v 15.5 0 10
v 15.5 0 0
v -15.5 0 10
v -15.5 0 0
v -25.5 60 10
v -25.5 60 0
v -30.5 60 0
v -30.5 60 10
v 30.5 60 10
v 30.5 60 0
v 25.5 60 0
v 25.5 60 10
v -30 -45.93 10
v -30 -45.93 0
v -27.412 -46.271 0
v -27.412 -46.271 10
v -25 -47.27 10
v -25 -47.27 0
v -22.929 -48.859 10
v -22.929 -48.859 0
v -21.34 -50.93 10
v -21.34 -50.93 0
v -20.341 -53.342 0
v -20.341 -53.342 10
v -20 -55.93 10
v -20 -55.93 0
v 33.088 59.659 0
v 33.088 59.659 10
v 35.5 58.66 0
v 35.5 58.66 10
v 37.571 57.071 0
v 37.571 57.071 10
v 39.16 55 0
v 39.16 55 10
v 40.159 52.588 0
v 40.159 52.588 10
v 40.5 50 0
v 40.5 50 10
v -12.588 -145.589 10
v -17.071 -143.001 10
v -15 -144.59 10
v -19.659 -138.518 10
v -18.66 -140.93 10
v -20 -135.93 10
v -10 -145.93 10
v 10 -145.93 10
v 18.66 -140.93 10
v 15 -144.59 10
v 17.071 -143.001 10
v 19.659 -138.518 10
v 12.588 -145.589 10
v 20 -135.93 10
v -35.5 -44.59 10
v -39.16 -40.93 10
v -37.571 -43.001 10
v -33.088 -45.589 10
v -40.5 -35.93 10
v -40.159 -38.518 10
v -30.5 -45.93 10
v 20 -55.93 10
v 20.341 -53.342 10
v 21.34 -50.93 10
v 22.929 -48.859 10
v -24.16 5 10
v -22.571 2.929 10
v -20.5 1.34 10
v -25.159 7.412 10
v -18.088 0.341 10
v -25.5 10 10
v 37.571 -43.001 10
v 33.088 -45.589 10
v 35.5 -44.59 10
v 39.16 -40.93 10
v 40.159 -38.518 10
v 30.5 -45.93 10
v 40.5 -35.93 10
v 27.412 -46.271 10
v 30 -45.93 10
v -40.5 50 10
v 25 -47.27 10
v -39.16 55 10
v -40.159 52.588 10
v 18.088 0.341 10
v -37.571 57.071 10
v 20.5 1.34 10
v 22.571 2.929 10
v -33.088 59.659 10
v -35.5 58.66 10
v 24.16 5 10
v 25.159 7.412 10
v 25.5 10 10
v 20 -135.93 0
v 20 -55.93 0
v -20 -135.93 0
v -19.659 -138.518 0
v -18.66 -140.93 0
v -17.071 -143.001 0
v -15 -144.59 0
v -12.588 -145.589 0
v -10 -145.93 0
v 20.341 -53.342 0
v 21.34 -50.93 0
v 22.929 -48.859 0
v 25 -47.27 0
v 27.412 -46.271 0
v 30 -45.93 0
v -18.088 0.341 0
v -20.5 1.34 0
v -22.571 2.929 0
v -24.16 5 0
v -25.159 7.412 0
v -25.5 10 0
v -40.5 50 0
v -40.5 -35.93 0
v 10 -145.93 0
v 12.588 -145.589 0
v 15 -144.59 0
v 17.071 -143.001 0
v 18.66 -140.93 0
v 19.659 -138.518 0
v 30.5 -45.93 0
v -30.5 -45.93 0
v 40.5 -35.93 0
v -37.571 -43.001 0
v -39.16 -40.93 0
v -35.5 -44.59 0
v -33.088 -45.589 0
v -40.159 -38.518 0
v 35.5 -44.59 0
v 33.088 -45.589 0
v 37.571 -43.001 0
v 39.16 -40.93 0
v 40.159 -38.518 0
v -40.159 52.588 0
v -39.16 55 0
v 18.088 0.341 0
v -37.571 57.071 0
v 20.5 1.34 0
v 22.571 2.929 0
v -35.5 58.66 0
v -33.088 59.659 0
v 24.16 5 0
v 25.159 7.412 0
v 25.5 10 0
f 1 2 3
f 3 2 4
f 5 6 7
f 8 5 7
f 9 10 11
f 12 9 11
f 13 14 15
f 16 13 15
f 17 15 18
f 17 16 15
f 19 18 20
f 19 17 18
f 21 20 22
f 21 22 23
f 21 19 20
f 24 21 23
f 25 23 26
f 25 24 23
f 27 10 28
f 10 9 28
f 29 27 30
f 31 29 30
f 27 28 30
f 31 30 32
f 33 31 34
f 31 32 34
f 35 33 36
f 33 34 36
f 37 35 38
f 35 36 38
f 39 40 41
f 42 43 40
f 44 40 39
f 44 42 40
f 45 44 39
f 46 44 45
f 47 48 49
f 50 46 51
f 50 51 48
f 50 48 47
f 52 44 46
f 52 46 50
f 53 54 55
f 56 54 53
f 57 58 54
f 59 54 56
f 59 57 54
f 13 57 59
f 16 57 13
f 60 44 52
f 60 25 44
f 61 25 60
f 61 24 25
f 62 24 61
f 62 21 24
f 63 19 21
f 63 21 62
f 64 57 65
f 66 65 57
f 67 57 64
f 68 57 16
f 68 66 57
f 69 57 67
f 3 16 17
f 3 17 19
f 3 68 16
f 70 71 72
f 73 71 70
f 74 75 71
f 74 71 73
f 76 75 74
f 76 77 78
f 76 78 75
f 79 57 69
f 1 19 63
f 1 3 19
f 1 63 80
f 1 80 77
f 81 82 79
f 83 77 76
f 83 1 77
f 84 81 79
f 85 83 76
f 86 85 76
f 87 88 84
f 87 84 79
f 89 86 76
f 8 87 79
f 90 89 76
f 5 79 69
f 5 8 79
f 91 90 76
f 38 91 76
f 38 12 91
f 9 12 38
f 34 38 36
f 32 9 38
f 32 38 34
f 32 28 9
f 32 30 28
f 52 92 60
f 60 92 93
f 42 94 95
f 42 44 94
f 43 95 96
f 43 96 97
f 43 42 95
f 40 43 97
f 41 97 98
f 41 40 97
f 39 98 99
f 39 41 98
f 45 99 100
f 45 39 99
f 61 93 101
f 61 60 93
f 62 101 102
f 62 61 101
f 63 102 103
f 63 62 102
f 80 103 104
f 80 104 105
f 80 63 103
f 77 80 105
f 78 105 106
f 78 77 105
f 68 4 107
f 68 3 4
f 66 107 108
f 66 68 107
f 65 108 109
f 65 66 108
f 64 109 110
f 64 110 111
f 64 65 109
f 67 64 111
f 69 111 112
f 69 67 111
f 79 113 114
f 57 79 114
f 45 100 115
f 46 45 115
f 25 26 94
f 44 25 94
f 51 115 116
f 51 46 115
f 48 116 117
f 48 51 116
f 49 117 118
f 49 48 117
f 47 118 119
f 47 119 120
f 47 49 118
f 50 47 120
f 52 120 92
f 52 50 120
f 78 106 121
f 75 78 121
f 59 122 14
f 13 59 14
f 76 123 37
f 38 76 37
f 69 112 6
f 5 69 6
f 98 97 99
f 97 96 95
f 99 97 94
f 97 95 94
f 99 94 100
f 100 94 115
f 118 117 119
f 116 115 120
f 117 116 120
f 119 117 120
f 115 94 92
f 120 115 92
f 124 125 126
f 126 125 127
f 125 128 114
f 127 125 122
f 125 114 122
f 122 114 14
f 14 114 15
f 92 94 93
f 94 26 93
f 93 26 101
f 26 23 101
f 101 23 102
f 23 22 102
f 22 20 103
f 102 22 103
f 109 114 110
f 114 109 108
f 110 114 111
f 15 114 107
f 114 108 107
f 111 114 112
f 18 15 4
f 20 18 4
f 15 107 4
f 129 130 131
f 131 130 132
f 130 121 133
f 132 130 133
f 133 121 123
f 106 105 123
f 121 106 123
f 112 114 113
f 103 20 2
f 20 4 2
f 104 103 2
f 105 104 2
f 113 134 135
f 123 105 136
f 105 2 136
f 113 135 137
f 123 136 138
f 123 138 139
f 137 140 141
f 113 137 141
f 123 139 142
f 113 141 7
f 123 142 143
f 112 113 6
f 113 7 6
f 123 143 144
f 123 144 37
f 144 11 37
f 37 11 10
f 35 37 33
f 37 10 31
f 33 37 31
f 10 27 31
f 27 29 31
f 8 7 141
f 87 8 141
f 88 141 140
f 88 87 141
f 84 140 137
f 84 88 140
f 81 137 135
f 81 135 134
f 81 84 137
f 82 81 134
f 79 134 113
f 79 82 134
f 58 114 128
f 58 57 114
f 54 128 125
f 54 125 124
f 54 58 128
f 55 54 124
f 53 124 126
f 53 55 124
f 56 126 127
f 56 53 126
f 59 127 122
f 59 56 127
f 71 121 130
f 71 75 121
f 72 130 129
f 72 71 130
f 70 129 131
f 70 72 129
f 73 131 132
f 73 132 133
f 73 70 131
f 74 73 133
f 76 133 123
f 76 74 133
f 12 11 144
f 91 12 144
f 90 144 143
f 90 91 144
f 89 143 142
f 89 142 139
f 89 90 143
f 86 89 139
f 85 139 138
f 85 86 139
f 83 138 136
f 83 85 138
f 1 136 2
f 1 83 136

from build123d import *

# Parameters (mm, degrees)
F1_DEPTH = 10
F2_R     = 10


with BuildPart() as f1:
    # F0 (on Top) → F1 (new body)
    with BuildSketch(Plane.XY):
        Polygon((40.5, 60), (25.5, 60), (25.5, 0), (0, 0), (-25.5, 0), (-25.5, 60), (-40.5, 60), (-40.5, -45.930237), (-20, -45.930237), (-20, -145.930237), (0, -145.930237), (20, -145.930237), (20, -45.930237), (40.5, -45.930237), align=None)
    extrude(amount=F1_DEPTH)

    # F2
    f2_edges = [f1.edges().sort_by_distance(p)[0] for p in [
        (20, -145.930237, 5),
        (-20, -145.930237, 5),
        (40.5, -45.930237, 5),
        (20, -45.930237, 5),
        (-40.5, -45.930237, 5),
        (-20, -45.930237, 5),
        (25.5, 0, 5),
        (-25.5, 0, 5),
        (40.5, 60, 5),
        (-40.5, 60, 5),
    ]]
    fillet(f2_edges, radius=F2_R)


solid = f1.part
